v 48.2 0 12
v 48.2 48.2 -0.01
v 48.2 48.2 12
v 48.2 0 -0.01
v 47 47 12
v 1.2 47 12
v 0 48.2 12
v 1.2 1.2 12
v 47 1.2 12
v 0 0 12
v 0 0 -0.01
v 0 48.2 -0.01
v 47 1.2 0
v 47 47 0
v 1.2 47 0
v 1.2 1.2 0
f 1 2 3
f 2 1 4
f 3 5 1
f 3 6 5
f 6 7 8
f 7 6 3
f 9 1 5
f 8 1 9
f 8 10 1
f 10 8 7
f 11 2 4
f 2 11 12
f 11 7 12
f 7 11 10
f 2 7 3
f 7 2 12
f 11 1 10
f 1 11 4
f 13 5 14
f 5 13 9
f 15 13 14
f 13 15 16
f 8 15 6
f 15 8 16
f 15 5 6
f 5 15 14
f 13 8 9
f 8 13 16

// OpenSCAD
// file: ../Base/Rotation.scad
// Fischertechnik Box Foundation
// Geometry Helpers Rotation

include <PlacementOptions.scad>

// getRotatedSpace(space, rotation=NoRotation)
// Rotates the space dependent on the specified rotation

function getRotatedSpace(space, rotation=NoRotation) = [
    (rotation == Rotate90 || rotation == Rotate270) ? space.y : space.x,
    (rotation == Rotate90 || rotation == Rotate270) ? space.x : space.y
];

// Rotates the given space around the fixed left lower corner
// space = the space the children needs as width/depth list [width,depth]
// rotation = 0 Rotate0 degrees, 1 Rotate90 degrees, 2 Rotate180 degrees, 3 Rotate270 degrees (equivalent to -90)

module RotateFix(space, rotation=NoRotation) {
    dy = (rotation == Rotate0 || rotation == Rotate270) ? 0 :
        (rotation == Rotate90) ? space.x :
        space.y;
    dx = (rotation < Rotate180) ? 0 :
        (rotation == Rotate180) ? space.x :
        space.y;
    
    translate([dx, dy, 0])
        rotate([0, 0, rotations[rotation]])
            children();
}
// file: ../Base/Alignment.scad
// Fischertechnik Box Foundation
// Geometry Helpers Alignment

include <PlacementOptions.scad>

// getAlignedX(elementWidth, spaceWidth, align=AlignRight, offset=0)
// Gets the aligned X offset of an element with the given
// width in the given space.
// elementWidth = The width of the element to positon
// spaceWidth = The space where the element should be aligned
// align = 0 AlignLeft, 1 AlignCenter, 2 AlignRight
// offset = an optional offset from the aligned position. When
// aligned left or centered, then positive values are in X direction.
// When aligned right then positive values are in negative X direction.

function getAlignedX(elementWidth, spaceWidth, align=AlignRight, offset=0) =
    (align == AlignLeft) ?
        offset :
        ((align == AlignCenter) ?
        (spaceWidth - elementWidth)/2 + offset :
        spaceWidth - offset - elementWidth);

// getAlignedY(elementDepth, spaceDepth, align=AlignTop, offset=0)
// Gets the aligned Y offset of an element with the given
// depth in the given space.
// elementDepth = The depth of the element to positon
// spaceDepth = The space where the element should be aligned
// align = 0 AlignBottom, 1 AlignCenter, 2 AlignTop
// offset = an optional offset from the aligned position. When
// aligned bottom or centered, then positive values are in Y direction.
// When aligned top then positive values are in negative Y direction.

function getAlignedY(elementDepth, spaceDepth, align=AlignTop, offset=0) =
    (align == AlignBottom) ?
        offset :
        ((align == AlignCenter) ?
        (spaceDepth - elementDepth)/2 + offset :
        spaceDepth - offset - elementDepth);
// file: ../Base/PlacementOptions.scad
// Fischertechnik Box Foundation
// Placement Options

// Alignment
NoAlign = 0;
AlignLeft = 1;
AlignBottom = 2;
AlignCenter = 3;
AlignRight = 4;
AlignTop = 5;

// Element rotation degree steps
rotations = [0, -90, -180, -270];

// Rotation
NoRotation = 0;
Rotate0 = 0;
Rotate90 = 1;
Rotate180 = 2;
Rotate270 = 3;

// Docking (seen from above)
NoDock = -1;
DockLeft = 0;
DockTop = 1;
DockRight = 2;
DockCorner = 2;
DockBottom = 3;

// Web corners
LowerLeft = 0;
UpperLeft = 1;
UpperRight = 2;
LowerRight = 3;

// Web position relative to corner
LeftOfCorner = 0;
RightOfCorner = 1;
// file: ../Base/Boxes.scad
// Fischertechnik Box Foundation
// Pre-designed Boxes

use <Constants.scad>

include <PlacementOptions.scad>

box190Width = 190;
box190Depth = 130;
box130Width = 130;
box130Depth = 95;

// Values are from an original ec3 box
topBottomDifference = 1.5;
outerHeight = 40;
baseThickness = 1.8;
innerHeight = outerHeight - baseThickness;
stackExcess = 5.7;
radius = 3.5;
wallThickness = 1.5;
tolerance = 0.2;

boxWallThickness = wallThickness;
boxBaseThickness = baseThickness;
boxWebWidth = 3.0;

// getBoxWallThickness()
// Gets the wall thickness of a Fischertechnik Box
function getBoxWallThickness() = boxWallThickness;

// getBoxUsageHeight(height = 38.2)
// Gets the usable height of a Fischertechnik box
// height = Outer height of the box from the bottom to the upper edge.
function getBoxUsageHeight(height = outerHeight) = height - baseThickness - stackExcess;

// getBoxInnerHeight()
// Gets the inner height of a Fischertechnik box, including the stack excess
function getBoxInnerHeight() = innerHeight;

// getBoxBaseThickness()
// Gets the thickness of the Fischertechnik box base.
function getBoxBaseThickness() = boxBaseThickness;

// getBoxWebWidth()
// Gets the width of a box web
function getBoxWebWidth() = boxWebWidth;

// getBox190Space()
// Gets the usable inner space of a Box 190 as an x/y-list
function getBox190Space() = [
    box190Width - 2*getBoxWallThickness() - topBottomDifference, 
    box190Depth - 2*getBoxWallThickness() - topBottomDifference ];

// RoundedCornerPlate(width, depth, height, radius)
// Creates a body plate with rounded corners for a box. Used
// also to create the complete box with the hull module.
// width = Width of the plate
// depth = depth of the plate 
// height = thickness of the plate
// radius = radius of the rounded corner
module RoundedCornerPlate(width, depth, height, radius) {
    translate([radius, radius])
    hull() {
        w = width-2*radius;
        d = depth-2*radius;
        cube([w, d, height]);
        cylinder(height, r=radius, $fn=getFragments());
        translate([w, 0])
            cylinder(height, r=radius, $fn=getFragments());
        translate([w, d])
            cylinder(height, r=radius, $fn=getFragments());
        translate([0, d])
            cylinder(height, r=radius, $fn=getFragments());
    }
}

// BoxBase(width, depth)
// Creates an empty stackable Fischertechnik compatible box
// width = Outer width of the box (190, 130, ...)
// depth = Outer depth of the box (130, 95, ...)

module BoxBase(width, depth, height=outerHeight) {    
    thinPlate = 0.01;

    innerHeight = height - baseThickness;    
    
    module Body(tolerance=tolerance) {
        hull() {
            // Bottom with tolerance to fit into the original boxes when stacked
            translate([-wallThickness+tolerance, -wallThickness+tolerance, -baseThickness])
                RoundedCornerPlate(width-topBottomDifference-2*tolerance, depth-topBottomDifference-2*tolerance, thinPlate, radius);
            
            // Top
            translate([-wallThickness-topBottomDifference/2, -wallThickness-topBottomDifference/2, innerHeight-thinPlate])
                RoundedCornerPlate(width, depth, thinPlate, radius);
         }
    }

    module Cutoff() {
        hull() {
            coWidth = width - 2*wallThickness;
            coDepth = depth - 2*wallThickness;
            
            // Bottom
            RoundedCornerPlate(coWidth-topBottomDifference, coDepth-topBottomDifference, thinPlate, radius);

            // Top
            translate([-topBottomDifference/2, -topBottomDifference/2, innerHeight+thinPlate]) 
                RoundedCornerPlate(coWidth, coDepth, thinPlate, radius);
        }
    }
    
    difference() {        
        Body();
        Cutoff();
        stackOffset = innerHeight - stackExcess;
        translate([0, 0, stackOffset + baseThickness])
            Body(tolerance=0);
    }
}

// Creates the Fischertechnik empty box 130x190 mm and places it at position 0,0
// 190x130 are the outer sizes, the inner space is slightly smaller. Use getBox190Space() to get the inner sizes.
// The box is positioned that the usable inner space is at the 0,0,0 position.

module Box190() {
    BoxBase(box190Width, box190Depth);
}

// Gets the usable inner space of a Box 130 as an x/y-list
function getBox130Space() = [
    box130Width - 2*getBoxWallThickness() - topBottomDifference, 
    box130Depth - 2*getBoxWallThickness() - topBottomDifference ];

// Creates the Fischertechnik empty box 95x130 mm and places it at position 0,0
// 190x130 are the outer sizes, the inner space is slightly smaller. Use getBox190Space() to get the inner sizes.
// The box is positioned that the usable inner space is at the 0,0,0 position.

module Box130() {
    BoxBase(box130Width, box130Depth);
}

// Creates a web at the specified box walls
// corner 0 = LowerLeft, 1 = UpperLeft, 2 = UpperRight, 3 = LowerRight
// side 0 = LeftOfCorner, 1 = RightOfCorner
// distance = Distance in mm from the corner
// boxSpace = inner width and depth of the box (default: Box 190)
// webWidth = length of the web (default is 3 mms)
// webThickness = thickness of the web (default is 1 mm)
// height = Height of the web (standard is getBoxUsageHeight())
// sink = How much of the web is sunk into the wall

module BoxWeb(
    corner, 
    side, 
    distance, 
    boxSpace=getBox190Space(), 
    webWidth=getBoxWebWidth(), 
    webThickness=1.0, 
    height=getBoxUsageHeight(),
    sink = getBoxWallThickness()/2) {
    width = (corner % 2 == 0) ? 
            (side == LeftOfCorner ? webWidth : webThickness) :
            (side == LeftOfCorner ? webThickness : webWidth);

    depth = (corner % 2 == 0) ? 
            (side == RightOfCorner ? webWidth : webThickness) :
            (side == RightOfCorner ? webThickness : webWidth);
    
    xDiff = corner == LowerLeft ? 
                (side == LeftOfCorner ? -sink : distance) :
            (corner == UpperLeft ?                
                (side == LeftOfCorner ? distance : -sink) :
            (corner == UpperRight ?
                (side == LeftOfCorner ? boxSpace.x-webWidth+sink : boxSpace.x-distance-webThickness) :
                (side == LeftOfCorner ? boxSpace.x-distance-webThickness: boxSpace.x-webWidth+sink)));

    yDiff = corner == LowerLeft ? 
                (side == RightOfCorner ? -sink : distance) :
            (corner == UpperLeft ?
                (side == RightOfCorner ? boxSpace.y-distance-webThickness : boxSpace.y-webWidth+sink) :
            (corner == UpperRight ?
                (side == RightOfCorner ? boxSpace.y-webWidth+sink : boxSpace.y-distance-webThickness) :
                (side == RightOfCorner ? distance : -sink)));
    
    translate([xDiff, yDiff, -getExcess()])
        cube([width, depth, height + 2*getExcess()]);
}
// file: ../Base/Placement.scad
// Fischertechnik Box Foundation
// Geometry Helpers Placement

use <Constants.scad>
use <Alignment.scad>
use <Rotation.scad>
use <Boxes.scad>

include <PlacementOptions.scad>

// Place(x=0, y=0, elementSpace=[0,0], alignX=AlignLeft, alignY=AlignBottom, rotation=Rotate0, boxSpace=getBox190Space())
// Places the child at the specified position
// y = Y-Position. This is a relative position when an X aligment is specified.
// x = X-Position. This is a relative position when an Y aligment is specified.
// elementSpace = space of the element to be placed [x,y]
// alignX = -1=NoAlign, 0 AlignLeft, 1 AlignCenter, 3 AlignRight (elementSpace and boxSpace required!)
// alignY = -1=NoAlign, 2 AlignBottom, 1 AlignCenter, 4 AlignTop (elementSpace and boxSpace required!)
// rotation = 0 Rotate0 0 degrees, 1 Rotate90 90 degrees, 
// 2 Rotate180 180 degrees, 3 Rotate270 270 degrees (equivalent to -90)
// boxSpace = Inner space of the box where the placement occurs [x,y] - default is Box 190x130 inner space

module Place(x=0, y=0, elementSpace=[0,0], 
  alignX=AlignLeft, alignY=AlignBottom, 
  rotation=NoRotation, boxSpace=getBox190Space()) {

    module Position(x, y, space, rotation=Rotate0) {
        translate([x, y, 0])
            RotateFix(space, rotation)
                children();
    }

    space = getRotatedSpace(elementSpace, rotation);
    alignedX = getAlignedX(space.x, boxSpace.x, alignX, x);
    alignedY = getAlignedY(space.y, boxSpace.y, alignY, y);
    Position(alignedX, alignedY, elementSpace, rotation)
        children();
}

// Center(space=getBox130Space(), elementSpace=[0,0])
// space = Space where the children is centered. For cylinder use centered=true and no elementSpace.
// elementSpace = space of the element to be centered [x,y]

module Center(space=getBox190Space(), elementSpace=[0,0]) {
    Place(elementSpace=elementSpace, boxSpace=space, alignX=AlignCenter, alignY=AlignCenter)
        children();
}

// CenterHorizontal(width=0, y=0, offset=0, space=getBox130Space())
// width = Width of the element to be placed.
// y = Y position of the element
// offset = Offset from the center position (negative will be left of the center)
// space = Space where the element is placed

module CenterHorizontal(width=0, y=0, offset=0, space=getBox190Space()) {
    Place(x=offset, y=y, elementSpace=[width, 0], boxSpace=space, alignX=AlignCenter)
        children(0);
}

// CenterVertical(depth=0, x=0, offset=0, space=getBox130Space())
// depth = Depth of the element to be placed.
// x = X position of the element
// offset = Offset from the center position (negative will be down of the center)
// space = Space where the element is placed

module CenterVertical(depth=0, x=0, offset=0, space=getBox190Space()) {
    Place(x=x, y=offset, elementSpace=[0, depth], boxSpace=space, alignY=AlignCenter)
        children(0);
}

// getIsVertical(align)
// True if the specified alignment needs a vertical orientation for a divider (AlignRight, AlignLeft)

function getIsVertical(align) = (align == AlignRight || align == AlignLeft);

// getIsHorizontal(align)
// True if the specified alignment needs a horizontal orientation for a divider (AlignTop, AlignBottom)

function getIsHorizontal(align) = (align == AlignTop || align == AlignBottom);
// file: ../Base/Constants.scad
// Fischertechnik Box Foundation
// Constants

// Constant values necessary for multiple elements

// Base constants
dividerThickness = 1.2;
excess = 0.01;
fragments = 90;
tolerance = 0.8;

// Gets the thickness of a divider 
function getDividerThickness() = dividerThickness;

// Gets the excess that is used to merge walls into each other
function getExcess() = excess;

// Gets amount of fragments of a cylinder
function getFragments() = fragments;

// Gets the inner tolerance of a frame to each side
function getTolerance() = tolerance;


// Fischertechnik specific constants
axisDiameter = 4;
axisBottomDiameter = axisDiameter + 1;
axisTolerance = 0.2;

// Gets axis diameter of Fischertechnik axis
function getAxisDiameter() = axisDiameter;

// Gets axis diameter tolerance (subtracted for element axis)
function getAxisTolerance() = axisTolerance;

// Gets the axis diameter for standing axis
function getStandAxisDiameter() = getAxisDiameter() - getAxisTolerance();

// Gets axis bottom diameter for thicker part at the bottom
function getAxisBottomDiameter() = axisBottomDiameter;

pinHeight = 2.5;

// gets the height of a connecting pin
function getPinHeight() = pinHeight;

standardEdgeDistance = 2.5;
standardWebDistance = 11.5;
standardCornerLength = 15;

// gets the standard distance to the wall of the box for dockable frames with webs
function getStandardEdgeDistance() = standardEdgeDistance;

// gets the standard distance of each web to the corner of the dockable frame
function getStandardWebDistance() = standardWebDistance;

// gets the standard length of the corner walls of a dockable frame
function getStandardCornerLength() = standardCornerLength;

tubeWallFactor = 0.8;

// gets the wall thickness of a tube.
function getTubeWallThickness() = tubeWallFactor * getDividerThickness();

smallPartsFrameHeight = 20;

// gets the frame height for docked small parts boxes.
function getSmallPartsFrameHeight() = smallPartsFrameHeight;

hubRingDiameter = 19.5;
hubRingLevelDiameter = 21;

// gets the diameter of a tube matching the inner ring of a wheel
function getHubRingDiameter() = hubRingDiameter;

// gets the diameter of a hub tube with a thicker diameter
function getHubRingLevelDiameter() = hubRingLevelDiameter;
// main file
// Fischertechnik Box Library
// Frame for gear box
// 31048

use <../ModelBase/Simple.scad>

/* [Hidden] */
width = 45;
depth = 45;
height = 12;

// getFrameGearBoxSpace()
// Gets the space of a frame for a gearbox (mot2)

function getFrameGearBoxSpace() = getFrameOuterVolume([width, depth, height]);

// FrameGearBox()
// frame for a gearbox (mot2)

module FrameGearBox() {
    Frame([width, depth, height]);
}

// Tests
color("lightgray")
FrameGearBox();
